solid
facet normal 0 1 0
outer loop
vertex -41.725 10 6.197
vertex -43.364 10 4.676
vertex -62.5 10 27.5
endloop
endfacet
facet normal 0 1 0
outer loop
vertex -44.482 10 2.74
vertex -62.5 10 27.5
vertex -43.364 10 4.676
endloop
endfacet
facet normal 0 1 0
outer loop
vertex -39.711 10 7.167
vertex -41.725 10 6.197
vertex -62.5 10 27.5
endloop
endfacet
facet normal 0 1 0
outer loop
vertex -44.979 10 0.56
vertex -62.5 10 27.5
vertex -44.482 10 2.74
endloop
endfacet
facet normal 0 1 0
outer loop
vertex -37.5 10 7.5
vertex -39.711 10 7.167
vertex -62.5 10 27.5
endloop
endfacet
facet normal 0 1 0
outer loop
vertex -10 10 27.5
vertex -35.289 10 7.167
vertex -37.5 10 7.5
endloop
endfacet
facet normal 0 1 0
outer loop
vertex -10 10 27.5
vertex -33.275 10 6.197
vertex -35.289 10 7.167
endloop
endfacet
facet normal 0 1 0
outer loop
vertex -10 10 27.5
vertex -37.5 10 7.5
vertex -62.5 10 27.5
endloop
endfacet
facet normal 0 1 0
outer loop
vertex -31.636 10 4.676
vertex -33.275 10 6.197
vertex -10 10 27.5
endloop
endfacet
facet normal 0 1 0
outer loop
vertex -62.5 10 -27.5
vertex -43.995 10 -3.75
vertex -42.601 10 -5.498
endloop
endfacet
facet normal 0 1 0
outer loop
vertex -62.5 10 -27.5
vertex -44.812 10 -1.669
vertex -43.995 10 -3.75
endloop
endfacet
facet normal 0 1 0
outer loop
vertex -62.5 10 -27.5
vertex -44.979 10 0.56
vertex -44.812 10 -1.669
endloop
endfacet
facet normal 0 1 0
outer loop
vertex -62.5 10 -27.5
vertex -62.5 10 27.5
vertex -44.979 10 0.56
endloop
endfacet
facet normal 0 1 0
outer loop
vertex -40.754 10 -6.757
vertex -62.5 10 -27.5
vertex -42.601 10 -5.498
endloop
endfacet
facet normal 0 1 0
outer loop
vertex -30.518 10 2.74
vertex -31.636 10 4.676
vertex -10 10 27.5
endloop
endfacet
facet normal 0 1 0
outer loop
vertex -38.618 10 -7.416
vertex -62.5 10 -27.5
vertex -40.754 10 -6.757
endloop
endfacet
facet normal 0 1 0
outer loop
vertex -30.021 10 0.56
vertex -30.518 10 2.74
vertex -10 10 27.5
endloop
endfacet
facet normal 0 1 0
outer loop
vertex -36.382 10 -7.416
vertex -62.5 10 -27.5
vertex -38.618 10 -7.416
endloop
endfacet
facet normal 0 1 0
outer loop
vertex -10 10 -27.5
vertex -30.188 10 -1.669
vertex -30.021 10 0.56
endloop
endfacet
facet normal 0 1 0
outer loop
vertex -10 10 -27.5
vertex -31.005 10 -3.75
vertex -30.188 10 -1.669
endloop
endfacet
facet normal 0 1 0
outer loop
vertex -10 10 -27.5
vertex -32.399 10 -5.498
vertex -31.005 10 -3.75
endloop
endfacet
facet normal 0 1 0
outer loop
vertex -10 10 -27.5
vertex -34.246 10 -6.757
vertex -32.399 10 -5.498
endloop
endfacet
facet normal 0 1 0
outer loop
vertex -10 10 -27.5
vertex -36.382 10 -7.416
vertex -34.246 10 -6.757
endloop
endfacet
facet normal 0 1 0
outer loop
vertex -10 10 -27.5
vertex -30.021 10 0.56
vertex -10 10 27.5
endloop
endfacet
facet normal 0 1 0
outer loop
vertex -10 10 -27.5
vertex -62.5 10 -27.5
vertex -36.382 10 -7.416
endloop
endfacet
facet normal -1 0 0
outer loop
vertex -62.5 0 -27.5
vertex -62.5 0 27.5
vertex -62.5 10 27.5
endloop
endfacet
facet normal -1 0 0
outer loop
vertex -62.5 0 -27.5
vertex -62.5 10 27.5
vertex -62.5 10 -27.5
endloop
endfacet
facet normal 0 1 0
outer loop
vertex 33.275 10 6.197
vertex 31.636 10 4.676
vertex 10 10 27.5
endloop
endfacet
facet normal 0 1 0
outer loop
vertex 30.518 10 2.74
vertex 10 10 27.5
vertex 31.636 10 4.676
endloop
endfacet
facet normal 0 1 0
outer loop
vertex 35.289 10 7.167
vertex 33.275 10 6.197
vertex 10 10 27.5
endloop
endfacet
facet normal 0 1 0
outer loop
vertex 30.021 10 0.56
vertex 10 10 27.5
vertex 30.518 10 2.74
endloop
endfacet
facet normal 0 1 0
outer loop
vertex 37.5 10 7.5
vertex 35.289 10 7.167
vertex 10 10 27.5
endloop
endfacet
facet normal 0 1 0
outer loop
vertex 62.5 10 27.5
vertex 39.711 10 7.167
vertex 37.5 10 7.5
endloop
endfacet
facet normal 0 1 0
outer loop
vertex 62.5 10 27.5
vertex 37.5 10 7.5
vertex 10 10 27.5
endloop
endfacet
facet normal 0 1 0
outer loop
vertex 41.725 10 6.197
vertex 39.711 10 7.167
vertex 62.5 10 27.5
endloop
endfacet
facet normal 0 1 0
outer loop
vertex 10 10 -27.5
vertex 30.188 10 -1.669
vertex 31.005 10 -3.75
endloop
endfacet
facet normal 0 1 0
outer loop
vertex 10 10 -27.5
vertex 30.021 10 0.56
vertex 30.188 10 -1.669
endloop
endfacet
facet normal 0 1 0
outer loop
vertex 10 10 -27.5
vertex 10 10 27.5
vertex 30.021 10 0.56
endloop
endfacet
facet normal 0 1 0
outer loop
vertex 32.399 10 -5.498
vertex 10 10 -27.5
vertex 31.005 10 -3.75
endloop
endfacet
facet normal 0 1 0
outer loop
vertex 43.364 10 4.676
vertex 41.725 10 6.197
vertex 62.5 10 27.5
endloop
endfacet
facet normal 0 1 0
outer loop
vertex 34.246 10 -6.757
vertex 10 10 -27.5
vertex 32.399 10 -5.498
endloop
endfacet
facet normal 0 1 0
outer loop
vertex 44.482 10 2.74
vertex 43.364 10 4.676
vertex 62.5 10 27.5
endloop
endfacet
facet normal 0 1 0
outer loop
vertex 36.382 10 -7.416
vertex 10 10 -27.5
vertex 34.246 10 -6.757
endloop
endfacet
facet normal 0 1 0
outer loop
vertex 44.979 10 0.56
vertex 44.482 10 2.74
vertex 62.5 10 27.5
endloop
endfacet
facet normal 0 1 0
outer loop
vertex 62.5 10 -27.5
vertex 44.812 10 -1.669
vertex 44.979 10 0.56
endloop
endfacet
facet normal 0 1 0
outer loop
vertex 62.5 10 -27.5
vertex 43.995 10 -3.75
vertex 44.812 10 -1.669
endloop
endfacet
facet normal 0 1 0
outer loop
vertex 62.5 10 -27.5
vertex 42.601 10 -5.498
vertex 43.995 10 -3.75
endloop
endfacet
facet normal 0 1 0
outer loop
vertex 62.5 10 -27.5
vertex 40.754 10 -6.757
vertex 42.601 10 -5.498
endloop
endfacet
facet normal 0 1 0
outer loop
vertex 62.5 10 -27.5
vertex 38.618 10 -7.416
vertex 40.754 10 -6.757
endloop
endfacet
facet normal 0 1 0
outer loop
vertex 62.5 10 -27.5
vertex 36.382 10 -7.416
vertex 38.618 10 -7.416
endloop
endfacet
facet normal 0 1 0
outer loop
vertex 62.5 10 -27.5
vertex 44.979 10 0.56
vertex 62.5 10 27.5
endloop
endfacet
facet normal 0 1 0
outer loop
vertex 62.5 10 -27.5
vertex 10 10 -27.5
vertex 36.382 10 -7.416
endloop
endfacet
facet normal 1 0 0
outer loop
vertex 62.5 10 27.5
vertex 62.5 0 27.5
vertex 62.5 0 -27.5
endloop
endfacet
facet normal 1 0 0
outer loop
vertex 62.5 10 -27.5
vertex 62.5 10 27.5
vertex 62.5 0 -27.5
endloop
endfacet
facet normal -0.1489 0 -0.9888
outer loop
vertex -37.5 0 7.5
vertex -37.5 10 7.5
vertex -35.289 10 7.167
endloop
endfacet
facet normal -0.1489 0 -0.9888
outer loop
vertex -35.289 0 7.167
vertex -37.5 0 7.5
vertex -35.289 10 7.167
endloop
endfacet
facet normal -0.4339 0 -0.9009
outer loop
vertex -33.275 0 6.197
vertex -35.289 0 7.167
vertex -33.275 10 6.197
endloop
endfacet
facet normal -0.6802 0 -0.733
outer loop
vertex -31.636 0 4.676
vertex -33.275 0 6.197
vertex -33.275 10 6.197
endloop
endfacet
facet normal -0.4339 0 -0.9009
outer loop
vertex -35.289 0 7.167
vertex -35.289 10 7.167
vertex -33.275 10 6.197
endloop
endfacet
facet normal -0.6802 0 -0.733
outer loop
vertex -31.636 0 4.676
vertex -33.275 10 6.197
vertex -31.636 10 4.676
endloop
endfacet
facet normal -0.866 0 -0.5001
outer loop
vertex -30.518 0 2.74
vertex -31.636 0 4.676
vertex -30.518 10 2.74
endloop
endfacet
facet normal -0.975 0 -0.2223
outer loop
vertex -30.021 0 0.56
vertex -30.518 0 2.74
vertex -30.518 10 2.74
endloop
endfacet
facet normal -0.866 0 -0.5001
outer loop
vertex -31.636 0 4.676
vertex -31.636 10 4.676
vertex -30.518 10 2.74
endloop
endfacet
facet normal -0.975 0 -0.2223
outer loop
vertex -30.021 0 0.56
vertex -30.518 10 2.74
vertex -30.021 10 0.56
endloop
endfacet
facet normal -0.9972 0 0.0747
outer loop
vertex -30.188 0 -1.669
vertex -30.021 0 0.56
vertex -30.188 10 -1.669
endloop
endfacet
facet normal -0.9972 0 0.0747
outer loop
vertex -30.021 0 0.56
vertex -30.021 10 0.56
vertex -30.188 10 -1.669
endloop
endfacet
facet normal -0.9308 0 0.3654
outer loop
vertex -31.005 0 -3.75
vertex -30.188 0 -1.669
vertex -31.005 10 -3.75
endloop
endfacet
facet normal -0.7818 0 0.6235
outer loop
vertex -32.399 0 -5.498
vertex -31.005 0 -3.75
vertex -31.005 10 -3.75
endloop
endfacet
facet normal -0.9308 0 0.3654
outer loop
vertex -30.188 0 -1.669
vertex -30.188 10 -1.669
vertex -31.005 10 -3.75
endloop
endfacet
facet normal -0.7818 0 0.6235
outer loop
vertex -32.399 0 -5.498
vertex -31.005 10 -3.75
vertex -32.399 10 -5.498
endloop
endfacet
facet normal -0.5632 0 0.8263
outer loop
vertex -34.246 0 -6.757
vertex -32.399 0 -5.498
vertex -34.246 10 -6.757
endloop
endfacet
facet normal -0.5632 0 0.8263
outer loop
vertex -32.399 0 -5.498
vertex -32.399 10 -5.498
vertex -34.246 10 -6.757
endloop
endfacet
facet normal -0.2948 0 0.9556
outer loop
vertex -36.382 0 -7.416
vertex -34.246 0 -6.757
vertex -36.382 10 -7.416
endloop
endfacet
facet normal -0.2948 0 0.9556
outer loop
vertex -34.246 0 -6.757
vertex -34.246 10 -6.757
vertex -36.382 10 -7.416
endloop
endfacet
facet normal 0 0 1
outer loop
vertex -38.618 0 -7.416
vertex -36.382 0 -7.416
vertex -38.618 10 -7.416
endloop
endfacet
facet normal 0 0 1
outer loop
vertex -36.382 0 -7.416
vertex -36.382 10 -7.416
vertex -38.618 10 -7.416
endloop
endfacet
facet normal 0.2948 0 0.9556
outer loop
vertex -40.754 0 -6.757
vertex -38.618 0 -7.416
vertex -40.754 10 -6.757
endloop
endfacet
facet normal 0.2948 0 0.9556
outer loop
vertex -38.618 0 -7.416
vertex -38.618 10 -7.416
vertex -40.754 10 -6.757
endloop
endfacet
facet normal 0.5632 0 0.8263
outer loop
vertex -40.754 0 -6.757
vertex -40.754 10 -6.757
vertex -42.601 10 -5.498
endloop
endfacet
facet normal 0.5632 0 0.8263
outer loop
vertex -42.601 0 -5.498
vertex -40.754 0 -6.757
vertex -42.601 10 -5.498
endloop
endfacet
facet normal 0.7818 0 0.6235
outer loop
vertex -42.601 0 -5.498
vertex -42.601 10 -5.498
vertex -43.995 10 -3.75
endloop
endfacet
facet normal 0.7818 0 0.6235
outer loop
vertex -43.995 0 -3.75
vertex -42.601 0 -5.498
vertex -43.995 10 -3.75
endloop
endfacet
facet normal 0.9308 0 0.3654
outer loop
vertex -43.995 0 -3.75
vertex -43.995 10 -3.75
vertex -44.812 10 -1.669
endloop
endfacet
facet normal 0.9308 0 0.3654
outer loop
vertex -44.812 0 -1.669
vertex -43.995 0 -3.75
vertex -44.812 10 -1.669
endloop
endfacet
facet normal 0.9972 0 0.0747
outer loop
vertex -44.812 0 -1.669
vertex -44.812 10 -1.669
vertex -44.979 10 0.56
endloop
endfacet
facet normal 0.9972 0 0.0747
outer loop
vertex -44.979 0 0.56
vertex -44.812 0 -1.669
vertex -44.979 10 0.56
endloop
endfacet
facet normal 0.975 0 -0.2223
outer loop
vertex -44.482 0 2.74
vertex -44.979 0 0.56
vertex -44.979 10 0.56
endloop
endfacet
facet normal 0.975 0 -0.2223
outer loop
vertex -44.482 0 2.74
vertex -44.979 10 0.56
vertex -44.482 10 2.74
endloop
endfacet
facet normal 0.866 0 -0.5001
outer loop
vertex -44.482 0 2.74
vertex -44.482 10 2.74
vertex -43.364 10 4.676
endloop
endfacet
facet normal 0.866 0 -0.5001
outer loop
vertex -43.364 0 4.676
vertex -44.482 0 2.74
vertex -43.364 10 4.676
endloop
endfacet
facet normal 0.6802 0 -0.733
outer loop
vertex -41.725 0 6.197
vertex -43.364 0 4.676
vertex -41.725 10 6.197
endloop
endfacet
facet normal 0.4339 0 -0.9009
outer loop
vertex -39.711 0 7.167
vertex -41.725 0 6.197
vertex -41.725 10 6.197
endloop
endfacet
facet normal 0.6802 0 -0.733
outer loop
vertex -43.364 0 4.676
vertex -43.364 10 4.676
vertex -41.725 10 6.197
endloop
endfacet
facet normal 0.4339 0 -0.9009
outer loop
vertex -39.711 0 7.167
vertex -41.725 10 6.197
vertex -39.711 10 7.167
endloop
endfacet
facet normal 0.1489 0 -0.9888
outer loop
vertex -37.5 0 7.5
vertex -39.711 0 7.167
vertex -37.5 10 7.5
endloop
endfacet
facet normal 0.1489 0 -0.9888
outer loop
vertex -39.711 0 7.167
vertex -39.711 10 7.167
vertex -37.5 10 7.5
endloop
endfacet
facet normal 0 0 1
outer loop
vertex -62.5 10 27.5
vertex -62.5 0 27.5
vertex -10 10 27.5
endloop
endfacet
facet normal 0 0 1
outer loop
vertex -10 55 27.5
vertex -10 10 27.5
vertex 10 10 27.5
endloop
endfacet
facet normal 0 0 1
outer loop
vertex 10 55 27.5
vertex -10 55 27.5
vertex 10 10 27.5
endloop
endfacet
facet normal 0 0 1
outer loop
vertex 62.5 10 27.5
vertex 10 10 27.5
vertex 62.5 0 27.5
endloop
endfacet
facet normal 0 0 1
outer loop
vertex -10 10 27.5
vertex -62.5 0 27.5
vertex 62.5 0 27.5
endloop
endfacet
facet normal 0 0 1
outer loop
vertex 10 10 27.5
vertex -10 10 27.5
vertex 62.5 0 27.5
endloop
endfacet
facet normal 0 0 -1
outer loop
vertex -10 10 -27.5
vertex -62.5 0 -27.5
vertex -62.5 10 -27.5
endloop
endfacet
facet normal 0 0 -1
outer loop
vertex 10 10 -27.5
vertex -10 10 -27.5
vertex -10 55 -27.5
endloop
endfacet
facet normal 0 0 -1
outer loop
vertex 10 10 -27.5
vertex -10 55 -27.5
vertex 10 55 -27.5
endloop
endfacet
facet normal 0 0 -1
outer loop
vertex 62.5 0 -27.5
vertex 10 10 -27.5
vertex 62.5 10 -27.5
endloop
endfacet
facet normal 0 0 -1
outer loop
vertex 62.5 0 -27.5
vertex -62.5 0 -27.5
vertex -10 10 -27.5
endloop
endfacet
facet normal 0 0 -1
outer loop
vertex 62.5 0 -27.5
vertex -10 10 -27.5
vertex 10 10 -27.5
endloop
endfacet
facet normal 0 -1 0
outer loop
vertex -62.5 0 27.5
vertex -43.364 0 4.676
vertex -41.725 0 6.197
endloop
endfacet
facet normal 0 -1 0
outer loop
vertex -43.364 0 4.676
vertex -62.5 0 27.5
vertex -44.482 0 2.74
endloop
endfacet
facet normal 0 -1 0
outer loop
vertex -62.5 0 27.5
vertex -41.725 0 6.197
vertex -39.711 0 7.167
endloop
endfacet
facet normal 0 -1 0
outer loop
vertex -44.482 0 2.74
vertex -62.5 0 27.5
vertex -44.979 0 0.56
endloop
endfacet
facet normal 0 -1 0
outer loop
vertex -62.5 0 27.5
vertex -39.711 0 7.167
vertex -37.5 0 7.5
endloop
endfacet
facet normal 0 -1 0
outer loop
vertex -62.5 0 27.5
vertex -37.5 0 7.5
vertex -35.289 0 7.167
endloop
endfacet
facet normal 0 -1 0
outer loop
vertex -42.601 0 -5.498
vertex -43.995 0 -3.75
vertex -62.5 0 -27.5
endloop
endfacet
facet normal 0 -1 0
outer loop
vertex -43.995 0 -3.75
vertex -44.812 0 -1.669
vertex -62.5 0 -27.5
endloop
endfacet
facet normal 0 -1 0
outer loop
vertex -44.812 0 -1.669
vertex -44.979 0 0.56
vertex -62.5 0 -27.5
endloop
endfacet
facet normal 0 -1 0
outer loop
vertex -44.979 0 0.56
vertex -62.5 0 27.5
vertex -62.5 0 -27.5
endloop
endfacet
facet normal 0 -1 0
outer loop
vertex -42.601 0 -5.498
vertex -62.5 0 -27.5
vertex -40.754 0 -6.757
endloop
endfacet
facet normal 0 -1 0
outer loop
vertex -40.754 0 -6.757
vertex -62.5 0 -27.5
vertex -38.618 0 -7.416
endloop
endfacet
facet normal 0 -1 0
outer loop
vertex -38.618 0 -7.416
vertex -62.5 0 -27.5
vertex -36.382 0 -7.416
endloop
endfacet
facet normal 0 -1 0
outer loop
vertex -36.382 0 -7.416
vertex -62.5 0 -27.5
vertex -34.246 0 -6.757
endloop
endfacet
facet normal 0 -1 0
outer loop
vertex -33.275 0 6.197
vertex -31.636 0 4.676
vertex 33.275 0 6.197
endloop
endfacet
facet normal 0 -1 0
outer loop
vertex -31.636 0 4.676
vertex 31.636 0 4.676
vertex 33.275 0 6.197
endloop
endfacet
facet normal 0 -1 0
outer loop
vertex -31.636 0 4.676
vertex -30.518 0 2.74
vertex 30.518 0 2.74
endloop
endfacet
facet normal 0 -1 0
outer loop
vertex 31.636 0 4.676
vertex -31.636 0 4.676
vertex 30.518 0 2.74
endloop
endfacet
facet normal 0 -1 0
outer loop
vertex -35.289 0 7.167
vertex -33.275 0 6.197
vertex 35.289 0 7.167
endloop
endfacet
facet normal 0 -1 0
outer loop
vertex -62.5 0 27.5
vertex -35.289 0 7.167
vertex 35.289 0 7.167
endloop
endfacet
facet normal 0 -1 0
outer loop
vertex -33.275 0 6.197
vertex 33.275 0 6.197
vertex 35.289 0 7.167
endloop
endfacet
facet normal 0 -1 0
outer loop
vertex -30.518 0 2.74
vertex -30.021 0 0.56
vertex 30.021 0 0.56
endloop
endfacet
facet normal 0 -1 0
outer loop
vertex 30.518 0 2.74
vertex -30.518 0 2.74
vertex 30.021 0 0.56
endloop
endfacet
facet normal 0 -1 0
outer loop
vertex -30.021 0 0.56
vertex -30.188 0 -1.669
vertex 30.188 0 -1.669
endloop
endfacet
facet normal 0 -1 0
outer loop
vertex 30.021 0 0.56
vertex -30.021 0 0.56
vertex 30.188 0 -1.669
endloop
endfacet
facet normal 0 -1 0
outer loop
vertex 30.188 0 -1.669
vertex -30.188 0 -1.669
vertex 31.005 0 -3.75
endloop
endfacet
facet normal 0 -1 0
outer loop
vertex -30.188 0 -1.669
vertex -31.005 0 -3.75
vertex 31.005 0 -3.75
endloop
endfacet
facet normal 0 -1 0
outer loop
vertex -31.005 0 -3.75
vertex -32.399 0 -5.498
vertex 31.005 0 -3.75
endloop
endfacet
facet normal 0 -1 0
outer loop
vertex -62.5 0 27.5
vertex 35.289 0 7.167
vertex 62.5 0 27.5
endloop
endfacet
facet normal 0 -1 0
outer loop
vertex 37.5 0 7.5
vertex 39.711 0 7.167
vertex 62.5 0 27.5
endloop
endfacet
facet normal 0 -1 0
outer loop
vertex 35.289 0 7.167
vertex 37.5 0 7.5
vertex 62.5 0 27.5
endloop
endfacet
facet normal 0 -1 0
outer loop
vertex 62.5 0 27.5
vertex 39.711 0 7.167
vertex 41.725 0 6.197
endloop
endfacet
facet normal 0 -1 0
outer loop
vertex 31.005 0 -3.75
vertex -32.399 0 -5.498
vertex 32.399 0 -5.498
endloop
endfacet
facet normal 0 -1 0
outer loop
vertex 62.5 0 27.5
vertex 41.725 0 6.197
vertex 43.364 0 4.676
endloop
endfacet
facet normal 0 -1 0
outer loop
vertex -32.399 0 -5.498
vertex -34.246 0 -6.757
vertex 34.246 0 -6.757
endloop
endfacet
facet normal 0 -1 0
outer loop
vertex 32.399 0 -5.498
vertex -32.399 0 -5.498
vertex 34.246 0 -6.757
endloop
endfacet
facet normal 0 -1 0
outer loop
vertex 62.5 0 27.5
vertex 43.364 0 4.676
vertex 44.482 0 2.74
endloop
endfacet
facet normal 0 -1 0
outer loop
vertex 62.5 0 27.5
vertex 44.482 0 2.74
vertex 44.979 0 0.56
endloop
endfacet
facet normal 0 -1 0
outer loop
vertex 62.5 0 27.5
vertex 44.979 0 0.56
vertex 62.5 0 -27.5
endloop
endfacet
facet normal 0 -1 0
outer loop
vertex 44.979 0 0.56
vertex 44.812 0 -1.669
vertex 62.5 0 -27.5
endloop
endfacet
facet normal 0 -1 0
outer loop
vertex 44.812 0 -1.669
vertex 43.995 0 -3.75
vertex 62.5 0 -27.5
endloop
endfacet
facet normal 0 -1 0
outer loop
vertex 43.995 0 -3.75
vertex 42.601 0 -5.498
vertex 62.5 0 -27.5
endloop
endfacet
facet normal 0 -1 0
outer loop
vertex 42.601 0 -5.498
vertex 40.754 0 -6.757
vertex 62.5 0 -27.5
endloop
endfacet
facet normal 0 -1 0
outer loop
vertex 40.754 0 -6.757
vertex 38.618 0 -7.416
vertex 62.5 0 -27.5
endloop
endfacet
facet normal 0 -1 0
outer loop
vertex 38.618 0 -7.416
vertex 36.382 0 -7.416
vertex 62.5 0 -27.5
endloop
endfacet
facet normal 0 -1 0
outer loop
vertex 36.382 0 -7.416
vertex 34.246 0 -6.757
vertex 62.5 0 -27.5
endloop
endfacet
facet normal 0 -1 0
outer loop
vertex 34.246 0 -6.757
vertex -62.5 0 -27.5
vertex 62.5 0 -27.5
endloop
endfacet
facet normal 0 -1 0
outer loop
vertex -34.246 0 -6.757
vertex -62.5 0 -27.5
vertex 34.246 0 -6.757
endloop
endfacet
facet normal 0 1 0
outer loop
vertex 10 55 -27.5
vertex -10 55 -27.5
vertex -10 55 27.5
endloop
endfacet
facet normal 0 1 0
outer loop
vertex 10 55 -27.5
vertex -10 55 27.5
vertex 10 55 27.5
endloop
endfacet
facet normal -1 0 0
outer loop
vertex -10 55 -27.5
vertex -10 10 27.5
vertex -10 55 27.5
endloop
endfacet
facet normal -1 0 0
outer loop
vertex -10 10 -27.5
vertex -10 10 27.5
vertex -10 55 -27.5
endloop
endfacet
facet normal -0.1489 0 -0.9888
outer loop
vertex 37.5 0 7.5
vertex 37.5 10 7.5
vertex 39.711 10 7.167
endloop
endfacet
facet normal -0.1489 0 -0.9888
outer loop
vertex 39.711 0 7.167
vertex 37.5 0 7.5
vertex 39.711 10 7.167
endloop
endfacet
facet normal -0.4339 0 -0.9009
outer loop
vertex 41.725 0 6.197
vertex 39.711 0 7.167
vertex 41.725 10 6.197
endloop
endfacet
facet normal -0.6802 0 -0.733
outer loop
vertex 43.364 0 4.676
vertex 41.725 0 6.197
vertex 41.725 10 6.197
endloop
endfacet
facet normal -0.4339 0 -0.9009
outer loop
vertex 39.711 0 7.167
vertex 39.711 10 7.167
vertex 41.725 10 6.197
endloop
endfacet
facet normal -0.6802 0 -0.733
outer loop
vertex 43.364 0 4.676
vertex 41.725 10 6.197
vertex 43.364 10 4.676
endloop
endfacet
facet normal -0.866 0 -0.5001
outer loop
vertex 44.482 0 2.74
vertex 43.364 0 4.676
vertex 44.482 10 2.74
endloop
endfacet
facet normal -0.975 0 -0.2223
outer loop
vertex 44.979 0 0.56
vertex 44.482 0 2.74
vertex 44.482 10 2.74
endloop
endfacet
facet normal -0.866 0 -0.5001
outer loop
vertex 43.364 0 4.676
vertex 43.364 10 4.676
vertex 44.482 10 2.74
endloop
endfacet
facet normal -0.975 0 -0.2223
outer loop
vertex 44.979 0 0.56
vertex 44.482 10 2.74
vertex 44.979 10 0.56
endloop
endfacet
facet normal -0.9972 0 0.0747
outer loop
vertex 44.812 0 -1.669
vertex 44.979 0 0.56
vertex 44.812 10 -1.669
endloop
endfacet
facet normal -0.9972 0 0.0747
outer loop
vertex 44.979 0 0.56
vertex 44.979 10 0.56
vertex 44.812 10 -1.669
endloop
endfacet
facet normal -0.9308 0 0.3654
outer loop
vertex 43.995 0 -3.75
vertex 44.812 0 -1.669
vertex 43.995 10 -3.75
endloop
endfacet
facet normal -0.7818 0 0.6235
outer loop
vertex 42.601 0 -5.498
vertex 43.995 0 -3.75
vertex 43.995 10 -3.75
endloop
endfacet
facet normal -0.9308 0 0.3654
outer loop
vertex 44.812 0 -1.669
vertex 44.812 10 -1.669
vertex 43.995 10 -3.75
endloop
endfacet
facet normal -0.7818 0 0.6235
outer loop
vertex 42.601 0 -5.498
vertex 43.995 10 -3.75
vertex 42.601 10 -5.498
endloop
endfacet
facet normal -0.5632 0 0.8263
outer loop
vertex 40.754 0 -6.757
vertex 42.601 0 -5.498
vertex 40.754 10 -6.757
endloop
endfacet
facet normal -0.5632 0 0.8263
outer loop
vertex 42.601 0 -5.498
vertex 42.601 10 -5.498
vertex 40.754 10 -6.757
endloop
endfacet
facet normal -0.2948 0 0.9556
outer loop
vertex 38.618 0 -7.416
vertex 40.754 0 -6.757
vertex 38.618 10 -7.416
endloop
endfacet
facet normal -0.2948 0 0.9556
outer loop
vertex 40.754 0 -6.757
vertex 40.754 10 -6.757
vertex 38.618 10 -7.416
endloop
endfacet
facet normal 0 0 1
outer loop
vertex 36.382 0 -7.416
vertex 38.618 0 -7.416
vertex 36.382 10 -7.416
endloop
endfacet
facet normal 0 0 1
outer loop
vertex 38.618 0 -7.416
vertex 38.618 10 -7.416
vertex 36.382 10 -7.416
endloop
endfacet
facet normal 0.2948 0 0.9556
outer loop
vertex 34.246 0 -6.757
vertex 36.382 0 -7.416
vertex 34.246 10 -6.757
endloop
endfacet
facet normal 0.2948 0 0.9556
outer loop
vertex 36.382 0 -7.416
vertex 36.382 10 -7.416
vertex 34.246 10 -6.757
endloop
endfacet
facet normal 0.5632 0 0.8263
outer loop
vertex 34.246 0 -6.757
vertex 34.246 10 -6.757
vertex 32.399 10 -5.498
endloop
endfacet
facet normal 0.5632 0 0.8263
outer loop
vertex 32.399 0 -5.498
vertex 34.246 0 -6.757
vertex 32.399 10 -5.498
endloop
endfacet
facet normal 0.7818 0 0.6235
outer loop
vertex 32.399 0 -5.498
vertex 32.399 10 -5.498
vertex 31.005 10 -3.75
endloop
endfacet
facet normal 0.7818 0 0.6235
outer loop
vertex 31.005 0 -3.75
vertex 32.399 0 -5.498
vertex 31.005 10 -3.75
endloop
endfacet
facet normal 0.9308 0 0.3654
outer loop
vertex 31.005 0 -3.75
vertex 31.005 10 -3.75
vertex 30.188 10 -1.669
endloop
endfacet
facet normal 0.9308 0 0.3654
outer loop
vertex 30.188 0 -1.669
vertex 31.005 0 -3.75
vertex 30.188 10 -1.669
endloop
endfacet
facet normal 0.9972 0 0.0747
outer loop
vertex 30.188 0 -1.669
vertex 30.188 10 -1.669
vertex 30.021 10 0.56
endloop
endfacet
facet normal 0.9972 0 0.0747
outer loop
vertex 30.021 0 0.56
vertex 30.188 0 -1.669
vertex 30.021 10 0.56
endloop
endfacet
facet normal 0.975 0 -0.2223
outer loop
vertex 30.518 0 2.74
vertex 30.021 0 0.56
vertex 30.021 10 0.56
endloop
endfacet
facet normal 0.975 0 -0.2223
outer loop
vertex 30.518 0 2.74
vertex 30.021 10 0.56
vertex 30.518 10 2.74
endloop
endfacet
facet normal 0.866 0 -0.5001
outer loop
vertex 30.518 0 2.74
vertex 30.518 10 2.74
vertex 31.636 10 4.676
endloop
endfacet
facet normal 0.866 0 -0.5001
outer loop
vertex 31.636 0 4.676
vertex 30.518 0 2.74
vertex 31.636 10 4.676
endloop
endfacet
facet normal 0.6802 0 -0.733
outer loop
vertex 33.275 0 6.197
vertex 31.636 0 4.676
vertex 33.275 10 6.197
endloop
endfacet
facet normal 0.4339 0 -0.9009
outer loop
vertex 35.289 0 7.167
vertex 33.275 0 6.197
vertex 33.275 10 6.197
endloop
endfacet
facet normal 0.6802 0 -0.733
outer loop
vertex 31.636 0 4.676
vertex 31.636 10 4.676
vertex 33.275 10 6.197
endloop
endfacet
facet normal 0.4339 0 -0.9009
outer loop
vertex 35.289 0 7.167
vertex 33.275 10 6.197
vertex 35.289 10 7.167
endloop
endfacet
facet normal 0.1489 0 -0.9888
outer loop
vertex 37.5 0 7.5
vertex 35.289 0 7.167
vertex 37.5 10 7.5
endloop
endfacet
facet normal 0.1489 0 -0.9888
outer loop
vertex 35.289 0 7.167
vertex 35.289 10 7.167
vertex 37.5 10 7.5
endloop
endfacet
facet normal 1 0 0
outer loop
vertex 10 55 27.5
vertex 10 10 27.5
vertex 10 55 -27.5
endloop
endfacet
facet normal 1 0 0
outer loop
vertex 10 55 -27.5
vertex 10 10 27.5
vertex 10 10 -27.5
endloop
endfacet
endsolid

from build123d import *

# Parameters (mm, degrees)
SKETCH1_W           = 125
SKETCH1_H           = 55
BOSS_EXTRUDE1_DEPTH = 10
SKETCH2_R           = 7.5
CUT_EXTRUDE1_DEPTH  = 10
SKETCH3_W           = 20
SKETCH3_H           = 55
BOSS_EXTRUDE2_DEPTH = 45


with BuildPart() as part:
    # Sketch1 → Boss-Extrude1 (new body)
    with BuildSketch(Plane(origin=(0, 0, 0), x_dir=(1, 0, 0), z_dir=(0, 1, 0))):
        Rectangle(SKETCH1_W, SKETCH1_H)
    extrude(amount=BOSS_EXTRUDE1_DEPTH)

    # Sketch2 → Cut-Extrude1 (cut)
    with BuildSketch(Plane(origin=(0, 10, 0), x_dir=(1, 0, 0), z_dir=(0, 1, 0))):
        with Locations(Location((-37.5, 0, 0), (0, 0, 270))):
            Circle(SKETCH2_R)
        with Locations(Location((37.5, 0, 0), (0, 0, 270))):
            Circle(SKETCH2_R)
    extrude(amount=-CUT_EXTRUDE1_DEPTH, mode=Mode.SUBTRACT)

    # Sketch3 → Boss-Extrude2 (add)
    with BuildSketch(Plane(origin=(0, 10, 0), x_dir=(1, 0, 0), z_dir=(0, 1, 0))):
        Rectangle(SKETCH3_W, SKETCH3_H)
    extrude(amount=BOSS_EXTRUDE2_DEPTH)


solid = part.part
